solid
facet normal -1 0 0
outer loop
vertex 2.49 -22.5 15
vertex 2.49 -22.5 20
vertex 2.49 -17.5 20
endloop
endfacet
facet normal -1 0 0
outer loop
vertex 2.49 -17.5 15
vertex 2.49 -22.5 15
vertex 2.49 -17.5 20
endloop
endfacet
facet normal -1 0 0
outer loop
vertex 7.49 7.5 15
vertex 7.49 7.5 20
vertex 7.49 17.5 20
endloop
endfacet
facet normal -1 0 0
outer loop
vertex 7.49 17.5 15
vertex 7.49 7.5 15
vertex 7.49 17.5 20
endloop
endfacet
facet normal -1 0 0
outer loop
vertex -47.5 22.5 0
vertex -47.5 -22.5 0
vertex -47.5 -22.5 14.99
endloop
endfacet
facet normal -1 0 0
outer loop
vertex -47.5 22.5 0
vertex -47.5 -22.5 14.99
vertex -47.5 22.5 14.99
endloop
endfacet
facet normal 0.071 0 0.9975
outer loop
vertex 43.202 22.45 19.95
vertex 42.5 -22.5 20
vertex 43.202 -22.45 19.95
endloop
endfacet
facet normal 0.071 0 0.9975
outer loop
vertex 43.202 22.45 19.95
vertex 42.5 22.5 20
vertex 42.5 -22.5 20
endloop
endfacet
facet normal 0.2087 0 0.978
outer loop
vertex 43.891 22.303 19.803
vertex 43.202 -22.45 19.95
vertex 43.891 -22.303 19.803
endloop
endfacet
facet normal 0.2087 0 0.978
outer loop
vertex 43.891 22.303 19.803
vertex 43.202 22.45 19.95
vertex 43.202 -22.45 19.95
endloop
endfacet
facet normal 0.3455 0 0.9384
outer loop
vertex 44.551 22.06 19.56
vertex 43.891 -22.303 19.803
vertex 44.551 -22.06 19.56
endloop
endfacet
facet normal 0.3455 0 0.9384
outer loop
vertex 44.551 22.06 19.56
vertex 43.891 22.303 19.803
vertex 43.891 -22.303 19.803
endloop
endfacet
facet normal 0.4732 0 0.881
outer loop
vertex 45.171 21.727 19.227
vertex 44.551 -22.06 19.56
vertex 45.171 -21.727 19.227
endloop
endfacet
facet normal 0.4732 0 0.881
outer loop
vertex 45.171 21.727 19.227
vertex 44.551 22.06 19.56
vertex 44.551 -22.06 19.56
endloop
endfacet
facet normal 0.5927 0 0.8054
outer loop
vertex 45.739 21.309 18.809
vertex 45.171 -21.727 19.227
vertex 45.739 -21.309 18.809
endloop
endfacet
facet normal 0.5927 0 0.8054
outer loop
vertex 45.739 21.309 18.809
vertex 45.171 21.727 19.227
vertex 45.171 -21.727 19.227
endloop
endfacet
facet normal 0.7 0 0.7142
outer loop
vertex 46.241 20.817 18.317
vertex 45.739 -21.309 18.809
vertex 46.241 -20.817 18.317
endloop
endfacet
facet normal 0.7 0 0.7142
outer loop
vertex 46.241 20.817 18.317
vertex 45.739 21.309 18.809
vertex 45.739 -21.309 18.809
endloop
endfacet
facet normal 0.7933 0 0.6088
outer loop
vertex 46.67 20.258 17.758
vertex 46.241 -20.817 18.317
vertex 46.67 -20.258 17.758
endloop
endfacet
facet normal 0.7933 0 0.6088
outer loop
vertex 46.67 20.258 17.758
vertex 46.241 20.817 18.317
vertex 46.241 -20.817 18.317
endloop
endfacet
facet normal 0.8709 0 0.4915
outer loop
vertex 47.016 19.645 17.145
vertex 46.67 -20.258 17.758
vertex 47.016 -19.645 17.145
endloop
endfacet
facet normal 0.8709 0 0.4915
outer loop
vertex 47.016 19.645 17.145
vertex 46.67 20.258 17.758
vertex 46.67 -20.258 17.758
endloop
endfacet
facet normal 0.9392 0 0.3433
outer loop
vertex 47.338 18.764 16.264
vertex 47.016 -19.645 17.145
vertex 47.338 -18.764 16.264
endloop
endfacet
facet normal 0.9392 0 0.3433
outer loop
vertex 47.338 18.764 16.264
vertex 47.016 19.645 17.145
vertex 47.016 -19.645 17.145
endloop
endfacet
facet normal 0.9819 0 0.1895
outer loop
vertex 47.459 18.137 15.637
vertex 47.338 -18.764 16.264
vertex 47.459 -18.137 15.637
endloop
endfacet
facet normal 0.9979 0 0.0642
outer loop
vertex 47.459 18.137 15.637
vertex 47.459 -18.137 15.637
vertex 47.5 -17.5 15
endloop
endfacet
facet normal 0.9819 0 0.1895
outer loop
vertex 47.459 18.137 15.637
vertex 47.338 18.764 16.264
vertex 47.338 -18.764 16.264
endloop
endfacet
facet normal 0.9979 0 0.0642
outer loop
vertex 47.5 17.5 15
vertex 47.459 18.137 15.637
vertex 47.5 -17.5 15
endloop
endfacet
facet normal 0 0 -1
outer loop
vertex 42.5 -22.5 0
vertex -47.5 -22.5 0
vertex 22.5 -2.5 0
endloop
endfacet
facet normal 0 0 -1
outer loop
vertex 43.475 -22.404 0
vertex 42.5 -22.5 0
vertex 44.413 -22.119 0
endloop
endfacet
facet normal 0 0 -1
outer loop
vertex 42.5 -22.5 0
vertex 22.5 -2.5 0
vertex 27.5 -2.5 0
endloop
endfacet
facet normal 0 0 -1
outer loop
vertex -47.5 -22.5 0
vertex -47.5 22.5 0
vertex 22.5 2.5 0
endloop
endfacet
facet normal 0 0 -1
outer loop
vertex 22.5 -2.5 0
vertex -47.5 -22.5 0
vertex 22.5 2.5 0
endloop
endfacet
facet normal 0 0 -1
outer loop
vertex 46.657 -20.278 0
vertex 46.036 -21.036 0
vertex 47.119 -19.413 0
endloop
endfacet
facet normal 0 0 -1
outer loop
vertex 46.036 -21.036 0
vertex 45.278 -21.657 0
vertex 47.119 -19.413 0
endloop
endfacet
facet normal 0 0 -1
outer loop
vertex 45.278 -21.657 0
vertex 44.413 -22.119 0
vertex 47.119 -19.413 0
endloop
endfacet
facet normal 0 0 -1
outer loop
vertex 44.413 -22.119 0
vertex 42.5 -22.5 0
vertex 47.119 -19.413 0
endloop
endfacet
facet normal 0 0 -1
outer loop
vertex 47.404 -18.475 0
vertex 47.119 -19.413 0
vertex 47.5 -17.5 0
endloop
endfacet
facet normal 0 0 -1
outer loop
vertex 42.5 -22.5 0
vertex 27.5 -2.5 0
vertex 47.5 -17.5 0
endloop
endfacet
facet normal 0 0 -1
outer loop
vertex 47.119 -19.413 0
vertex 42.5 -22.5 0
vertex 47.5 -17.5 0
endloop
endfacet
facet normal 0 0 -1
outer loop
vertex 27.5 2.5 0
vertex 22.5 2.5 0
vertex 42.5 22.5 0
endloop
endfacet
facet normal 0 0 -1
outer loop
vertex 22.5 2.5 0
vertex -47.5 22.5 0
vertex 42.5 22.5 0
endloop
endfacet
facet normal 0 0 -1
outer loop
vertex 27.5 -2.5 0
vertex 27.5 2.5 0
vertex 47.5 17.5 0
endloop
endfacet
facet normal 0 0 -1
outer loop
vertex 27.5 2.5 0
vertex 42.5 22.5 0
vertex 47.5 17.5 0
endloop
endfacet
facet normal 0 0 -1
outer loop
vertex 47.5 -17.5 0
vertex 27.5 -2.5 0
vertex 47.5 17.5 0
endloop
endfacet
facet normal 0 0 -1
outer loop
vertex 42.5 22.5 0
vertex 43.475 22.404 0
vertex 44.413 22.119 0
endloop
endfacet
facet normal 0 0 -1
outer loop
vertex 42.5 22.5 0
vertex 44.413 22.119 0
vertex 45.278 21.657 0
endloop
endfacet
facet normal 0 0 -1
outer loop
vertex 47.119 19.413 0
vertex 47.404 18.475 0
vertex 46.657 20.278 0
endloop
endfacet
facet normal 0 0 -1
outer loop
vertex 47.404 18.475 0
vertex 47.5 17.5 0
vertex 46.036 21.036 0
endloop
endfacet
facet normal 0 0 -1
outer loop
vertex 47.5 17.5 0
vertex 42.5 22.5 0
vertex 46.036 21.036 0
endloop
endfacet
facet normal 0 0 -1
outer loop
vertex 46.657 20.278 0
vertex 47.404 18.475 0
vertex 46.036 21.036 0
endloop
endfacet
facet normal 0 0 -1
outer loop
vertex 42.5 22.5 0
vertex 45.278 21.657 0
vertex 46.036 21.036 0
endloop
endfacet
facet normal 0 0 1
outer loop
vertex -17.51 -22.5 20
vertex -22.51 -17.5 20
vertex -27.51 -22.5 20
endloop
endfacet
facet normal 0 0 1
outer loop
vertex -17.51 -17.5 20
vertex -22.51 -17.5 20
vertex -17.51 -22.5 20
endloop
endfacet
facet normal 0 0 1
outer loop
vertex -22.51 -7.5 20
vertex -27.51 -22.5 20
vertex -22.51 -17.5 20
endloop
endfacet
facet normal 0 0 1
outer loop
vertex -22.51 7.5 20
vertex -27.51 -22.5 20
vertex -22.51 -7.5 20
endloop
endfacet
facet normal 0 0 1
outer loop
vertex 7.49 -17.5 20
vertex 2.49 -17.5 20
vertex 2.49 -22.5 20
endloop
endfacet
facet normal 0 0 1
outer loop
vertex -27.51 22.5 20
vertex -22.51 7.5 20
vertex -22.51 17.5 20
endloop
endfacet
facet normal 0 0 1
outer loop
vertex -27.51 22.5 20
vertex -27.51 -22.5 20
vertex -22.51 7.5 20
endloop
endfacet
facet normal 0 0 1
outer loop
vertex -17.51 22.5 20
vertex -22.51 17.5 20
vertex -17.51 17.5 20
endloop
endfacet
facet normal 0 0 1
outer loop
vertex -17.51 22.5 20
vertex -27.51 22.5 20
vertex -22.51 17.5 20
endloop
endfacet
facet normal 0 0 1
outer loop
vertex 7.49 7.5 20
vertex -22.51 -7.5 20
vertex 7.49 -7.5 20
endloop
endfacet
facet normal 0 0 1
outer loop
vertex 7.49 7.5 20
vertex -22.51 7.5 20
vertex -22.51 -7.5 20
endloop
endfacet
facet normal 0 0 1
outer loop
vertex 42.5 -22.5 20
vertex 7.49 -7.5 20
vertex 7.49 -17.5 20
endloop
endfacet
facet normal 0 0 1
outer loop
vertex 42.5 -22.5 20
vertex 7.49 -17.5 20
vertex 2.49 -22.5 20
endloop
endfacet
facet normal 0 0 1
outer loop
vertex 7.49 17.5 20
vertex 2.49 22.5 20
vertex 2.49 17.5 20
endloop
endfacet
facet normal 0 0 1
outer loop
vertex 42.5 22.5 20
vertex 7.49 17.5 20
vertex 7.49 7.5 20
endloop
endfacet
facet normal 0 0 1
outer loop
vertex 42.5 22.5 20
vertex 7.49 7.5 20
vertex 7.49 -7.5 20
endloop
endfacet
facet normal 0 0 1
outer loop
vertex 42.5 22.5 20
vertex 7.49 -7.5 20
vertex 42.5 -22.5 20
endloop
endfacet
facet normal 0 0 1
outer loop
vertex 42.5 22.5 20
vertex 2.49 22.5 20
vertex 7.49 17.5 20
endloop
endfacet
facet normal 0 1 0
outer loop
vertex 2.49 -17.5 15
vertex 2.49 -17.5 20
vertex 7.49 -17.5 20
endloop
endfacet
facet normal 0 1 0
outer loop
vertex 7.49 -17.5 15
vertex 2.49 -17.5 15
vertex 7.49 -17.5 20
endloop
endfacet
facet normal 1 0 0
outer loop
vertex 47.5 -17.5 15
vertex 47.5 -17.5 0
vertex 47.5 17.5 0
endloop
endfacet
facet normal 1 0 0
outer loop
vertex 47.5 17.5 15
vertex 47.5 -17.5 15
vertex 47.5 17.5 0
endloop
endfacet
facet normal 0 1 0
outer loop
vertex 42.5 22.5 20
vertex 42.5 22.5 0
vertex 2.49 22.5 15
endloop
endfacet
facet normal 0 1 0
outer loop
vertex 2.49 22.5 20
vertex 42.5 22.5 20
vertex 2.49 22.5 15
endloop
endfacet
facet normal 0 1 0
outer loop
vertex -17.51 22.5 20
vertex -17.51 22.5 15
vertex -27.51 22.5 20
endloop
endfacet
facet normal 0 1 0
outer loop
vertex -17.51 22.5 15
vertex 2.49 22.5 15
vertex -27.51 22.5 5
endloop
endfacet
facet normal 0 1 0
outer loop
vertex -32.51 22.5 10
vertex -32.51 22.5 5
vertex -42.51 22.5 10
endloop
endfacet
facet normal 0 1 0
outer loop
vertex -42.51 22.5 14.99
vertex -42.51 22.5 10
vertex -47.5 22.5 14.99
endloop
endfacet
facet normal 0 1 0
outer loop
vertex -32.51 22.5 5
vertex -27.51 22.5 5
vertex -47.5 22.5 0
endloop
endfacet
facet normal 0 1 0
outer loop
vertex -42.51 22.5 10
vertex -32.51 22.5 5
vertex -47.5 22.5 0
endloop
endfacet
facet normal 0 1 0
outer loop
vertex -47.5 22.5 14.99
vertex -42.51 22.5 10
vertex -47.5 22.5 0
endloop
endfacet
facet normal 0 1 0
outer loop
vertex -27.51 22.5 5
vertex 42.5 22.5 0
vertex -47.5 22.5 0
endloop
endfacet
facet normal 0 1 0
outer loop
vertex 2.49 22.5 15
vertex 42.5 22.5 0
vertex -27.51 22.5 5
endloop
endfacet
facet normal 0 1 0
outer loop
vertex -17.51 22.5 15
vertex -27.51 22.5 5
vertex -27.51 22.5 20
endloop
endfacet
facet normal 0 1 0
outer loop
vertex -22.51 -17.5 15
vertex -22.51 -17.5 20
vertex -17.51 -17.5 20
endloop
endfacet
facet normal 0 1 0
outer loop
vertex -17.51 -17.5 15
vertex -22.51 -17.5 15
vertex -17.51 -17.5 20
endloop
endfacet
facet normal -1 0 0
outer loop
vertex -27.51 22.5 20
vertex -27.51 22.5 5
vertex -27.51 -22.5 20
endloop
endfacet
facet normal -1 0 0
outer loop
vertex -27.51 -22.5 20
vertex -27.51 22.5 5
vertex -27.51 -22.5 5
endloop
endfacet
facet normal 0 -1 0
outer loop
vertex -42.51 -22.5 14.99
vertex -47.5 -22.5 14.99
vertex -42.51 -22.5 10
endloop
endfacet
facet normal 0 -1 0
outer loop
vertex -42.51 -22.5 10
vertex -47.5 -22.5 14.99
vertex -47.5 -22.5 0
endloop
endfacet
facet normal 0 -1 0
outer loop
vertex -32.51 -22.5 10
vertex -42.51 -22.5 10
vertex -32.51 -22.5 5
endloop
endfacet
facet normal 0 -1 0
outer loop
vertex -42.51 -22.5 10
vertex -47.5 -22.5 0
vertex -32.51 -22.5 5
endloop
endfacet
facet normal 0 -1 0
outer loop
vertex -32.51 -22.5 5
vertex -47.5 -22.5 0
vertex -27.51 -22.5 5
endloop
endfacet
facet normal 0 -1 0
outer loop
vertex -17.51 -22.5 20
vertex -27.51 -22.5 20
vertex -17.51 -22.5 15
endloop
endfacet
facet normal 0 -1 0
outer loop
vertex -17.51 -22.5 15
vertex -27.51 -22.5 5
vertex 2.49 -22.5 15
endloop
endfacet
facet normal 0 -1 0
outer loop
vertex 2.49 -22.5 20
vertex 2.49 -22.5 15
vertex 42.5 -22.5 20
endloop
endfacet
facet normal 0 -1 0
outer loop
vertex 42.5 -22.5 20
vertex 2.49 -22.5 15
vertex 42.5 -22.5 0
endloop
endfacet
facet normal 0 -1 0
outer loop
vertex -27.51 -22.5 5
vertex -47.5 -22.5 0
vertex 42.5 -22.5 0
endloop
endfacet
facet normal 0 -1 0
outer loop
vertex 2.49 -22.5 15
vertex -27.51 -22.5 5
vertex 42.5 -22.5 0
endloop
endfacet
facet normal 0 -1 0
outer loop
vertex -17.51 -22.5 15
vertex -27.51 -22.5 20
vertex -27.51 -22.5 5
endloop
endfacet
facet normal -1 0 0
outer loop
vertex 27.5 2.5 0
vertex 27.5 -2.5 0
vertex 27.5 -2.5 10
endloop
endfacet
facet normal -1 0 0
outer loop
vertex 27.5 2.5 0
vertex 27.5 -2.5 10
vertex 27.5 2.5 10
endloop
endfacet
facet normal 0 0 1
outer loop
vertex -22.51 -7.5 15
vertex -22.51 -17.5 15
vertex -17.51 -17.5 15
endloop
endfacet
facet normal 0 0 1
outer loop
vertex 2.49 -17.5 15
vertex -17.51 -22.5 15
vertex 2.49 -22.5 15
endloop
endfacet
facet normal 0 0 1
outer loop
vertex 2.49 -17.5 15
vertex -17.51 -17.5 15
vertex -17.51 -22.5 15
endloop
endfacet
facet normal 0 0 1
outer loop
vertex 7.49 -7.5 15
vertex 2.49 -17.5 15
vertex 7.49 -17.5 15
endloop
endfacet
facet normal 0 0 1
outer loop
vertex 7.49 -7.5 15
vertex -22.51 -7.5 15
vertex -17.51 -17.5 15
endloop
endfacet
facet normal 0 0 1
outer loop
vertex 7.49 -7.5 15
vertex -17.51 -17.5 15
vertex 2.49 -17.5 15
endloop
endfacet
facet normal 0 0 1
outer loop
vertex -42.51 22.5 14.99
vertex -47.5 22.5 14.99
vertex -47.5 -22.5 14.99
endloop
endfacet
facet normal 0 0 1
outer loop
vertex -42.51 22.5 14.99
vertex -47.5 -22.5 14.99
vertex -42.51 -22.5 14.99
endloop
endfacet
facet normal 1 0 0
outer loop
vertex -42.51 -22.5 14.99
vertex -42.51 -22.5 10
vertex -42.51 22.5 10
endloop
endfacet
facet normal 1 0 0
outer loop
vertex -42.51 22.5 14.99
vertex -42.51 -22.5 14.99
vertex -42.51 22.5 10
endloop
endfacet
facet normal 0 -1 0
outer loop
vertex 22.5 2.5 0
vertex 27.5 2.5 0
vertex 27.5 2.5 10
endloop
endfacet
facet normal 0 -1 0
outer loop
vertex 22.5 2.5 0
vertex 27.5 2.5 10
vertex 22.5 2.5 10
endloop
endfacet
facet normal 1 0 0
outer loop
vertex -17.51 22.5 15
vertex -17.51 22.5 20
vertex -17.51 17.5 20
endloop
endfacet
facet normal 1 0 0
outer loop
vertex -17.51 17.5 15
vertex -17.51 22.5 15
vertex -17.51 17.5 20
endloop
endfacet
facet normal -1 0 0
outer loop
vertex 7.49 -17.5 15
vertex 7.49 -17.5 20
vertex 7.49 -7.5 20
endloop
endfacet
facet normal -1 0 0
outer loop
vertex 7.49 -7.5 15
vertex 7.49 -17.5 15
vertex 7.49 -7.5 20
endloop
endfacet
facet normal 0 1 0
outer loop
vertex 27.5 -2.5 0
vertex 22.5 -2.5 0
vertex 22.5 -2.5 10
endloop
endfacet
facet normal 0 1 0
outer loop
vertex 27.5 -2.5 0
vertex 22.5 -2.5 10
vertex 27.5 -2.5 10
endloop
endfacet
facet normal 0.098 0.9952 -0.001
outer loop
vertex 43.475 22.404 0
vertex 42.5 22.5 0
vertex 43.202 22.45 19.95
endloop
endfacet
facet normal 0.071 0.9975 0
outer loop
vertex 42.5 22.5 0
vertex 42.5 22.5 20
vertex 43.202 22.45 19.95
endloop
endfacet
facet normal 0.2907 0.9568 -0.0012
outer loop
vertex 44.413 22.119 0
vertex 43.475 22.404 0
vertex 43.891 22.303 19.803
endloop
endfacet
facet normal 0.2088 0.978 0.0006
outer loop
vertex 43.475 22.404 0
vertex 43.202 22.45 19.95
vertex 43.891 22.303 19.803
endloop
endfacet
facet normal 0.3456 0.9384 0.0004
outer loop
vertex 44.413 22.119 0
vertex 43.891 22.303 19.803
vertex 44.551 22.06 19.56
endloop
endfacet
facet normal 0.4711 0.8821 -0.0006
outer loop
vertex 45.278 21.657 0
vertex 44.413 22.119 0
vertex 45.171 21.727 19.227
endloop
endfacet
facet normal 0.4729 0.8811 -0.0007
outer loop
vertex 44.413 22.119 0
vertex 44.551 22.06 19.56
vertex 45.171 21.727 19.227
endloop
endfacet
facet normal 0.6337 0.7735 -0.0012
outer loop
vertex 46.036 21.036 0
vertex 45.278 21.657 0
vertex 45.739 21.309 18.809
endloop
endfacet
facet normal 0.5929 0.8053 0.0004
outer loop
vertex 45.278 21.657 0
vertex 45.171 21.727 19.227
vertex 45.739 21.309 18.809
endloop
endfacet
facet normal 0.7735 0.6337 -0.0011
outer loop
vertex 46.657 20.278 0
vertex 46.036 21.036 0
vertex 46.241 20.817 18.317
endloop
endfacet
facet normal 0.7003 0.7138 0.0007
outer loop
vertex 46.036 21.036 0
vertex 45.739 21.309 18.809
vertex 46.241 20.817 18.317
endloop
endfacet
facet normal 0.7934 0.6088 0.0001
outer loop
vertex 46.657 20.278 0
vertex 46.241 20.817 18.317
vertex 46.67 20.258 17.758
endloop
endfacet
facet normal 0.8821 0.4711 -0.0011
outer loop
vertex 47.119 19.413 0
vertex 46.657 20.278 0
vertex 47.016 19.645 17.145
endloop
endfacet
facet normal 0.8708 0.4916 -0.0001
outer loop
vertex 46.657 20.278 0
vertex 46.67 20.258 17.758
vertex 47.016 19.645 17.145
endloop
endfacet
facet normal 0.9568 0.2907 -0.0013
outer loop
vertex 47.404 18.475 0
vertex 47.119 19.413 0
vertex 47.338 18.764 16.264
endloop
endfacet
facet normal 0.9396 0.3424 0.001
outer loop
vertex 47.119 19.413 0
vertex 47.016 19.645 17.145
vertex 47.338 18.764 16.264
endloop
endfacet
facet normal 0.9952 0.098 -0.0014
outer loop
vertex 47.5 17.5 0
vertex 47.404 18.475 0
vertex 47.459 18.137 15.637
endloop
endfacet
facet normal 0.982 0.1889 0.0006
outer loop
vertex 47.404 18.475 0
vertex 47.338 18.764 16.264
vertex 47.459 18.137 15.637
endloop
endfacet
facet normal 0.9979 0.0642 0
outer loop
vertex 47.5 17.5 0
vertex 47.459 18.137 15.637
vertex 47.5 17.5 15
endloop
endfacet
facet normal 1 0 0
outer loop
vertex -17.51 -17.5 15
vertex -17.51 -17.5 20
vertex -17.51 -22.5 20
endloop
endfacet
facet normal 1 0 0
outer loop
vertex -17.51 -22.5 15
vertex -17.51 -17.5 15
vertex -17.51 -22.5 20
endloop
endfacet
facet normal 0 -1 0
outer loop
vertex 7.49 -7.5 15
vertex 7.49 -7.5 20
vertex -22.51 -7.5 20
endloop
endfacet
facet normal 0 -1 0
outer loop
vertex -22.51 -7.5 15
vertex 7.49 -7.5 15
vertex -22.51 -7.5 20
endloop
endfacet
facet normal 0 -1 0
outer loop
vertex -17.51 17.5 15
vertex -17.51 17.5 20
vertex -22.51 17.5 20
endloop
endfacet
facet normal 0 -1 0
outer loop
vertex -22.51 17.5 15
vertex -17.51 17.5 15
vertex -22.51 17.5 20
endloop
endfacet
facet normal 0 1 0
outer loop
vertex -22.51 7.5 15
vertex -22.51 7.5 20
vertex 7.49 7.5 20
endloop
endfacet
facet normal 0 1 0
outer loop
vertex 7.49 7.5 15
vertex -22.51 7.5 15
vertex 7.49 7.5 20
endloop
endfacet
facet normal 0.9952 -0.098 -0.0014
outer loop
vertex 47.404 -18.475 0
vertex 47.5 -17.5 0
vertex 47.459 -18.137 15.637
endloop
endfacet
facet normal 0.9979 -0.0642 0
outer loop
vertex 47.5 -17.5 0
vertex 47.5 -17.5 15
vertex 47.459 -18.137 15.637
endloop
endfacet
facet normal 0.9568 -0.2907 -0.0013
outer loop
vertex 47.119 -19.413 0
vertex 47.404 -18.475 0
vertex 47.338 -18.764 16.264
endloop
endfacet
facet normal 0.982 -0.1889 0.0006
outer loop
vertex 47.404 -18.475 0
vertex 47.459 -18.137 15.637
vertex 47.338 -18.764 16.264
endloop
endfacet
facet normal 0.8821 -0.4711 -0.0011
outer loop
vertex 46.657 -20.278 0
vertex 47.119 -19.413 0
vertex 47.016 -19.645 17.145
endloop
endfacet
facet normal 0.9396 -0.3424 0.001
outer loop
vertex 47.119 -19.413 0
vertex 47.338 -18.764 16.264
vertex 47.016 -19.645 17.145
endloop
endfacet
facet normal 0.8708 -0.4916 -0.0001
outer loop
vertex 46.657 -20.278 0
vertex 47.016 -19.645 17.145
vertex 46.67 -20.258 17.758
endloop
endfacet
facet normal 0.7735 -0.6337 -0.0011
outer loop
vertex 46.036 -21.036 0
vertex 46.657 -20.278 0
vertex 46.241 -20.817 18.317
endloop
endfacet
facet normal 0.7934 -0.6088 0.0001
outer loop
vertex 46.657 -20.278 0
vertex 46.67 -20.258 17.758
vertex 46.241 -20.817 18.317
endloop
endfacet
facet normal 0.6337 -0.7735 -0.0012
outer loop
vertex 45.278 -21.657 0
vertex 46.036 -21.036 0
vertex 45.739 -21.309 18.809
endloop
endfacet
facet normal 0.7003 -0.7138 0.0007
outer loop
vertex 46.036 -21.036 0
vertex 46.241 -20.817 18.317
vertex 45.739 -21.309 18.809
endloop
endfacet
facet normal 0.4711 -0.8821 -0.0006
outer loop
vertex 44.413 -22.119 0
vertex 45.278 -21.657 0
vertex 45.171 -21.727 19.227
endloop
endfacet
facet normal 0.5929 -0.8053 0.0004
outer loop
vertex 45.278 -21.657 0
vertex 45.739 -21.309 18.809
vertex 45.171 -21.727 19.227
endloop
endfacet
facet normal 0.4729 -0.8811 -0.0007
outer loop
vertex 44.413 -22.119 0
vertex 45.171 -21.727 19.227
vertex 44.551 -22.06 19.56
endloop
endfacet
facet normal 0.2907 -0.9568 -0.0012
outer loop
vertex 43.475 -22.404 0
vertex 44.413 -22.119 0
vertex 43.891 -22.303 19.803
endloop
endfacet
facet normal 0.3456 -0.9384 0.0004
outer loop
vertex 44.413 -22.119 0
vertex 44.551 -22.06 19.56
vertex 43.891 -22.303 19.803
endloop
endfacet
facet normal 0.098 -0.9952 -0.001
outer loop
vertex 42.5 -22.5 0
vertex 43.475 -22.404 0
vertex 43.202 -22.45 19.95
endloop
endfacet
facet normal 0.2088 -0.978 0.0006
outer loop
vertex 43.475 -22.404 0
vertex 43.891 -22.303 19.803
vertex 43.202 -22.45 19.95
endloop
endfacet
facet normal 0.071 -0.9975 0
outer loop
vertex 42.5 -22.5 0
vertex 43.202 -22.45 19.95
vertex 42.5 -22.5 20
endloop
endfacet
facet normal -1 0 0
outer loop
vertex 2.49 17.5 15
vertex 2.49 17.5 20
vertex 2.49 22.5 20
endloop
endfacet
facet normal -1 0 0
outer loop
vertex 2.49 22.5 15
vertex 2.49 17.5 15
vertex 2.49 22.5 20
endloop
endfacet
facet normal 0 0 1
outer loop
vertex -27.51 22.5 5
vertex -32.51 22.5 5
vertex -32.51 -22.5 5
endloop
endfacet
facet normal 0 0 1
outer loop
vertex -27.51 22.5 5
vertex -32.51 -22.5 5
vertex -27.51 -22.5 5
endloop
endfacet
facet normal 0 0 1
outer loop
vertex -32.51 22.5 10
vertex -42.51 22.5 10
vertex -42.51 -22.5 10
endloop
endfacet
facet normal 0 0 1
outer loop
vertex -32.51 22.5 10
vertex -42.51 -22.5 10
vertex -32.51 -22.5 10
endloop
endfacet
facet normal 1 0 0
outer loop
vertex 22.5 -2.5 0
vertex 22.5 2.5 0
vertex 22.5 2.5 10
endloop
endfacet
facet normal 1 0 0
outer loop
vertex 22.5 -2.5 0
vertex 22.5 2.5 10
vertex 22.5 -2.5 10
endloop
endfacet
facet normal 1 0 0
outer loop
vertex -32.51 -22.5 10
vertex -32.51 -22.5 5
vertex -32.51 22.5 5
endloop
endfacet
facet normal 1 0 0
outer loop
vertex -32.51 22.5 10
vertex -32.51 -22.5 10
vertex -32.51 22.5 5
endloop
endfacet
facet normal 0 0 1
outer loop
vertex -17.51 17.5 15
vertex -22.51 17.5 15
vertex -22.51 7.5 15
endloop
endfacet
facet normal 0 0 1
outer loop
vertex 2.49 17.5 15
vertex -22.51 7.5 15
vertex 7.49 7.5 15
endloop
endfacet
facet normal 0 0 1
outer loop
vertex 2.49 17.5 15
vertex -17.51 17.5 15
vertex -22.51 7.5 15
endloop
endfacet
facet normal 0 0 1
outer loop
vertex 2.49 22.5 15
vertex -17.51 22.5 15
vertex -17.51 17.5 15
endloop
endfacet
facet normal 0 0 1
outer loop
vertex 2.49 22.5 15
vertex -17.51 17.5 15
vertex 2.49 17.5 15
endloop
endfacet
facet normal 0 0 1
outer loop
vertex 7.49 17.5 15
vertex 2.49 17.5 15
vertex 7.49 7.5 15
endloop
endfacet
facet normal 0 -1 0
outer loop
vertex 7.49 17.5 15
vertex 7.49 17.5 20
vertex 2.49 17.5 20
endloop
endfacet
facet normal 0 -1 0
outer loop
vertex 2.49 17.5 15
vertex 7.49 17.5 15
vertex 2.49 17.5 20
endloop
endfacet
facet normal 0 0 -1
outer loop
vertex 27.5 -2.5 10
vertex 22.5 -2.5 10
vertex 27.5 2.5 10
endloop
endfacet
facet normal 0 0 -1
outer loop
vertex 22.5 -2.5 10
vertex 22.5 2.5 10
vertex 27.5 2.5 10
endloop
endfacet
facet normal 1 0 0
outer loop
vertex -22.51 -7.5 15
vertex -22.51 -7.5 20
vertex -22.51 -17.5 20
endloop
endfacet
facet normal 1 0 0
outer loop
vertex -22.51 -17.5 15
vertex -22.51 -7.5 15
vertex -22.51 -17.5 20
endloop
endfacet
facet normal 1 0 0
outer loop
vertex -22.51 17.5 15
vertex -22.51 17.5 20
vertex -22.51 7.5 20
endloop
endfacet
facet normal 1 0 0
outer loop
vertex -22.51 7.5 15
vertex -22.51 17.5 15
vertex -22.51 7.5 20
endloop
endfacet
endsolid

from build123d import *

# Parameters (mm, degrees)
F0_W     = 4.99
F0_H     = 45
F1_DEPTH = 14.99
F0_W_2   = 10
F2_DEPTH = 10
F0_W_3   = 5
F3_DEPTH = 5
F4_DEPTH = 20
F6_DEPTH = 5
F8_DEPTH = 10
F9_R     = 5


with BuildPart() as f1:
    # F0 (on Top) → F1 (new body)
    with BuildSketch(Plane.XY):
        with Locations((-45.005, 0)):
            Rectangle(F0_W, F0_H)
    extrude(amount=F1_DEPTH)

    # F0 (on Top) → F2 (join)
    with BuildSketch(Plane.XY):
        with Locations((-37.51, 0)):
            Rectangle(F0_W_2, F0_H)
    extrude(amount=F2_DEPTH)

    # F0 (on Top) → F3 (join)
    with BuildSketch(Plane.XY):
        with Locations((-30.01, 0)):
            Rectangle(F0_W_3, F0_H)
    extrude(amount=F3_DEPTH)

    # F0 (on Top) → F4 (join)
    with BuildSketch(Plane.XY):
        Polygon((47.5, 0), (47.5, 22.5), (-27.51, 22.5), (-27.51, -22.5), (47.5, -22.5), align=None)
    extrude(amount=F4_DEPTH)

    # F5 (on face) → F6 (cut)
    with BuildSketch(Plane.XY.offset(20)):
        Polygon((-17.51, -22.5), (2.49, -22.5), (2.49, -17.5), (7.49, -17.5), (7.49, -7.5), (-22.51, -7.5), (-22.51, -12.5), (-22.51, -17.5), (-17.51, -17.5), align=None)
        Polygon((2.49, 17.5), (2.49, 22.5), (-17.51, 22.5), (-17.51, 17.5), (-22.51, 17.5), (-22.51, 7.5), (7.49, 7.5), (7.49, 17.5), align=None)
    extrude(amount=-F6_DEPTH, mode=Mode.SUBTRACT)

    # F7 (on face) → F8 (cut)
    with BuildSketch(Plane.XY):
        Polygon((22.5, -2.5), (27.5, -2.5), (27.5, 0), (27.5, 2.5), (22.5, 2.5), align=None)
    extrude(amount=F8_DEPTH, mode=Mode.SUBTRACT)

    # F9
    f9_edges = [f1.edges().sort_by_distance(p)[0] for p in [
        (47.5, 0, 20),
        (47.5, 22.5, 10),
        (47.5, -22.5, 10),
    ]]
    fillet(f9_edges, radius=F9_R)


solid = f1.part
